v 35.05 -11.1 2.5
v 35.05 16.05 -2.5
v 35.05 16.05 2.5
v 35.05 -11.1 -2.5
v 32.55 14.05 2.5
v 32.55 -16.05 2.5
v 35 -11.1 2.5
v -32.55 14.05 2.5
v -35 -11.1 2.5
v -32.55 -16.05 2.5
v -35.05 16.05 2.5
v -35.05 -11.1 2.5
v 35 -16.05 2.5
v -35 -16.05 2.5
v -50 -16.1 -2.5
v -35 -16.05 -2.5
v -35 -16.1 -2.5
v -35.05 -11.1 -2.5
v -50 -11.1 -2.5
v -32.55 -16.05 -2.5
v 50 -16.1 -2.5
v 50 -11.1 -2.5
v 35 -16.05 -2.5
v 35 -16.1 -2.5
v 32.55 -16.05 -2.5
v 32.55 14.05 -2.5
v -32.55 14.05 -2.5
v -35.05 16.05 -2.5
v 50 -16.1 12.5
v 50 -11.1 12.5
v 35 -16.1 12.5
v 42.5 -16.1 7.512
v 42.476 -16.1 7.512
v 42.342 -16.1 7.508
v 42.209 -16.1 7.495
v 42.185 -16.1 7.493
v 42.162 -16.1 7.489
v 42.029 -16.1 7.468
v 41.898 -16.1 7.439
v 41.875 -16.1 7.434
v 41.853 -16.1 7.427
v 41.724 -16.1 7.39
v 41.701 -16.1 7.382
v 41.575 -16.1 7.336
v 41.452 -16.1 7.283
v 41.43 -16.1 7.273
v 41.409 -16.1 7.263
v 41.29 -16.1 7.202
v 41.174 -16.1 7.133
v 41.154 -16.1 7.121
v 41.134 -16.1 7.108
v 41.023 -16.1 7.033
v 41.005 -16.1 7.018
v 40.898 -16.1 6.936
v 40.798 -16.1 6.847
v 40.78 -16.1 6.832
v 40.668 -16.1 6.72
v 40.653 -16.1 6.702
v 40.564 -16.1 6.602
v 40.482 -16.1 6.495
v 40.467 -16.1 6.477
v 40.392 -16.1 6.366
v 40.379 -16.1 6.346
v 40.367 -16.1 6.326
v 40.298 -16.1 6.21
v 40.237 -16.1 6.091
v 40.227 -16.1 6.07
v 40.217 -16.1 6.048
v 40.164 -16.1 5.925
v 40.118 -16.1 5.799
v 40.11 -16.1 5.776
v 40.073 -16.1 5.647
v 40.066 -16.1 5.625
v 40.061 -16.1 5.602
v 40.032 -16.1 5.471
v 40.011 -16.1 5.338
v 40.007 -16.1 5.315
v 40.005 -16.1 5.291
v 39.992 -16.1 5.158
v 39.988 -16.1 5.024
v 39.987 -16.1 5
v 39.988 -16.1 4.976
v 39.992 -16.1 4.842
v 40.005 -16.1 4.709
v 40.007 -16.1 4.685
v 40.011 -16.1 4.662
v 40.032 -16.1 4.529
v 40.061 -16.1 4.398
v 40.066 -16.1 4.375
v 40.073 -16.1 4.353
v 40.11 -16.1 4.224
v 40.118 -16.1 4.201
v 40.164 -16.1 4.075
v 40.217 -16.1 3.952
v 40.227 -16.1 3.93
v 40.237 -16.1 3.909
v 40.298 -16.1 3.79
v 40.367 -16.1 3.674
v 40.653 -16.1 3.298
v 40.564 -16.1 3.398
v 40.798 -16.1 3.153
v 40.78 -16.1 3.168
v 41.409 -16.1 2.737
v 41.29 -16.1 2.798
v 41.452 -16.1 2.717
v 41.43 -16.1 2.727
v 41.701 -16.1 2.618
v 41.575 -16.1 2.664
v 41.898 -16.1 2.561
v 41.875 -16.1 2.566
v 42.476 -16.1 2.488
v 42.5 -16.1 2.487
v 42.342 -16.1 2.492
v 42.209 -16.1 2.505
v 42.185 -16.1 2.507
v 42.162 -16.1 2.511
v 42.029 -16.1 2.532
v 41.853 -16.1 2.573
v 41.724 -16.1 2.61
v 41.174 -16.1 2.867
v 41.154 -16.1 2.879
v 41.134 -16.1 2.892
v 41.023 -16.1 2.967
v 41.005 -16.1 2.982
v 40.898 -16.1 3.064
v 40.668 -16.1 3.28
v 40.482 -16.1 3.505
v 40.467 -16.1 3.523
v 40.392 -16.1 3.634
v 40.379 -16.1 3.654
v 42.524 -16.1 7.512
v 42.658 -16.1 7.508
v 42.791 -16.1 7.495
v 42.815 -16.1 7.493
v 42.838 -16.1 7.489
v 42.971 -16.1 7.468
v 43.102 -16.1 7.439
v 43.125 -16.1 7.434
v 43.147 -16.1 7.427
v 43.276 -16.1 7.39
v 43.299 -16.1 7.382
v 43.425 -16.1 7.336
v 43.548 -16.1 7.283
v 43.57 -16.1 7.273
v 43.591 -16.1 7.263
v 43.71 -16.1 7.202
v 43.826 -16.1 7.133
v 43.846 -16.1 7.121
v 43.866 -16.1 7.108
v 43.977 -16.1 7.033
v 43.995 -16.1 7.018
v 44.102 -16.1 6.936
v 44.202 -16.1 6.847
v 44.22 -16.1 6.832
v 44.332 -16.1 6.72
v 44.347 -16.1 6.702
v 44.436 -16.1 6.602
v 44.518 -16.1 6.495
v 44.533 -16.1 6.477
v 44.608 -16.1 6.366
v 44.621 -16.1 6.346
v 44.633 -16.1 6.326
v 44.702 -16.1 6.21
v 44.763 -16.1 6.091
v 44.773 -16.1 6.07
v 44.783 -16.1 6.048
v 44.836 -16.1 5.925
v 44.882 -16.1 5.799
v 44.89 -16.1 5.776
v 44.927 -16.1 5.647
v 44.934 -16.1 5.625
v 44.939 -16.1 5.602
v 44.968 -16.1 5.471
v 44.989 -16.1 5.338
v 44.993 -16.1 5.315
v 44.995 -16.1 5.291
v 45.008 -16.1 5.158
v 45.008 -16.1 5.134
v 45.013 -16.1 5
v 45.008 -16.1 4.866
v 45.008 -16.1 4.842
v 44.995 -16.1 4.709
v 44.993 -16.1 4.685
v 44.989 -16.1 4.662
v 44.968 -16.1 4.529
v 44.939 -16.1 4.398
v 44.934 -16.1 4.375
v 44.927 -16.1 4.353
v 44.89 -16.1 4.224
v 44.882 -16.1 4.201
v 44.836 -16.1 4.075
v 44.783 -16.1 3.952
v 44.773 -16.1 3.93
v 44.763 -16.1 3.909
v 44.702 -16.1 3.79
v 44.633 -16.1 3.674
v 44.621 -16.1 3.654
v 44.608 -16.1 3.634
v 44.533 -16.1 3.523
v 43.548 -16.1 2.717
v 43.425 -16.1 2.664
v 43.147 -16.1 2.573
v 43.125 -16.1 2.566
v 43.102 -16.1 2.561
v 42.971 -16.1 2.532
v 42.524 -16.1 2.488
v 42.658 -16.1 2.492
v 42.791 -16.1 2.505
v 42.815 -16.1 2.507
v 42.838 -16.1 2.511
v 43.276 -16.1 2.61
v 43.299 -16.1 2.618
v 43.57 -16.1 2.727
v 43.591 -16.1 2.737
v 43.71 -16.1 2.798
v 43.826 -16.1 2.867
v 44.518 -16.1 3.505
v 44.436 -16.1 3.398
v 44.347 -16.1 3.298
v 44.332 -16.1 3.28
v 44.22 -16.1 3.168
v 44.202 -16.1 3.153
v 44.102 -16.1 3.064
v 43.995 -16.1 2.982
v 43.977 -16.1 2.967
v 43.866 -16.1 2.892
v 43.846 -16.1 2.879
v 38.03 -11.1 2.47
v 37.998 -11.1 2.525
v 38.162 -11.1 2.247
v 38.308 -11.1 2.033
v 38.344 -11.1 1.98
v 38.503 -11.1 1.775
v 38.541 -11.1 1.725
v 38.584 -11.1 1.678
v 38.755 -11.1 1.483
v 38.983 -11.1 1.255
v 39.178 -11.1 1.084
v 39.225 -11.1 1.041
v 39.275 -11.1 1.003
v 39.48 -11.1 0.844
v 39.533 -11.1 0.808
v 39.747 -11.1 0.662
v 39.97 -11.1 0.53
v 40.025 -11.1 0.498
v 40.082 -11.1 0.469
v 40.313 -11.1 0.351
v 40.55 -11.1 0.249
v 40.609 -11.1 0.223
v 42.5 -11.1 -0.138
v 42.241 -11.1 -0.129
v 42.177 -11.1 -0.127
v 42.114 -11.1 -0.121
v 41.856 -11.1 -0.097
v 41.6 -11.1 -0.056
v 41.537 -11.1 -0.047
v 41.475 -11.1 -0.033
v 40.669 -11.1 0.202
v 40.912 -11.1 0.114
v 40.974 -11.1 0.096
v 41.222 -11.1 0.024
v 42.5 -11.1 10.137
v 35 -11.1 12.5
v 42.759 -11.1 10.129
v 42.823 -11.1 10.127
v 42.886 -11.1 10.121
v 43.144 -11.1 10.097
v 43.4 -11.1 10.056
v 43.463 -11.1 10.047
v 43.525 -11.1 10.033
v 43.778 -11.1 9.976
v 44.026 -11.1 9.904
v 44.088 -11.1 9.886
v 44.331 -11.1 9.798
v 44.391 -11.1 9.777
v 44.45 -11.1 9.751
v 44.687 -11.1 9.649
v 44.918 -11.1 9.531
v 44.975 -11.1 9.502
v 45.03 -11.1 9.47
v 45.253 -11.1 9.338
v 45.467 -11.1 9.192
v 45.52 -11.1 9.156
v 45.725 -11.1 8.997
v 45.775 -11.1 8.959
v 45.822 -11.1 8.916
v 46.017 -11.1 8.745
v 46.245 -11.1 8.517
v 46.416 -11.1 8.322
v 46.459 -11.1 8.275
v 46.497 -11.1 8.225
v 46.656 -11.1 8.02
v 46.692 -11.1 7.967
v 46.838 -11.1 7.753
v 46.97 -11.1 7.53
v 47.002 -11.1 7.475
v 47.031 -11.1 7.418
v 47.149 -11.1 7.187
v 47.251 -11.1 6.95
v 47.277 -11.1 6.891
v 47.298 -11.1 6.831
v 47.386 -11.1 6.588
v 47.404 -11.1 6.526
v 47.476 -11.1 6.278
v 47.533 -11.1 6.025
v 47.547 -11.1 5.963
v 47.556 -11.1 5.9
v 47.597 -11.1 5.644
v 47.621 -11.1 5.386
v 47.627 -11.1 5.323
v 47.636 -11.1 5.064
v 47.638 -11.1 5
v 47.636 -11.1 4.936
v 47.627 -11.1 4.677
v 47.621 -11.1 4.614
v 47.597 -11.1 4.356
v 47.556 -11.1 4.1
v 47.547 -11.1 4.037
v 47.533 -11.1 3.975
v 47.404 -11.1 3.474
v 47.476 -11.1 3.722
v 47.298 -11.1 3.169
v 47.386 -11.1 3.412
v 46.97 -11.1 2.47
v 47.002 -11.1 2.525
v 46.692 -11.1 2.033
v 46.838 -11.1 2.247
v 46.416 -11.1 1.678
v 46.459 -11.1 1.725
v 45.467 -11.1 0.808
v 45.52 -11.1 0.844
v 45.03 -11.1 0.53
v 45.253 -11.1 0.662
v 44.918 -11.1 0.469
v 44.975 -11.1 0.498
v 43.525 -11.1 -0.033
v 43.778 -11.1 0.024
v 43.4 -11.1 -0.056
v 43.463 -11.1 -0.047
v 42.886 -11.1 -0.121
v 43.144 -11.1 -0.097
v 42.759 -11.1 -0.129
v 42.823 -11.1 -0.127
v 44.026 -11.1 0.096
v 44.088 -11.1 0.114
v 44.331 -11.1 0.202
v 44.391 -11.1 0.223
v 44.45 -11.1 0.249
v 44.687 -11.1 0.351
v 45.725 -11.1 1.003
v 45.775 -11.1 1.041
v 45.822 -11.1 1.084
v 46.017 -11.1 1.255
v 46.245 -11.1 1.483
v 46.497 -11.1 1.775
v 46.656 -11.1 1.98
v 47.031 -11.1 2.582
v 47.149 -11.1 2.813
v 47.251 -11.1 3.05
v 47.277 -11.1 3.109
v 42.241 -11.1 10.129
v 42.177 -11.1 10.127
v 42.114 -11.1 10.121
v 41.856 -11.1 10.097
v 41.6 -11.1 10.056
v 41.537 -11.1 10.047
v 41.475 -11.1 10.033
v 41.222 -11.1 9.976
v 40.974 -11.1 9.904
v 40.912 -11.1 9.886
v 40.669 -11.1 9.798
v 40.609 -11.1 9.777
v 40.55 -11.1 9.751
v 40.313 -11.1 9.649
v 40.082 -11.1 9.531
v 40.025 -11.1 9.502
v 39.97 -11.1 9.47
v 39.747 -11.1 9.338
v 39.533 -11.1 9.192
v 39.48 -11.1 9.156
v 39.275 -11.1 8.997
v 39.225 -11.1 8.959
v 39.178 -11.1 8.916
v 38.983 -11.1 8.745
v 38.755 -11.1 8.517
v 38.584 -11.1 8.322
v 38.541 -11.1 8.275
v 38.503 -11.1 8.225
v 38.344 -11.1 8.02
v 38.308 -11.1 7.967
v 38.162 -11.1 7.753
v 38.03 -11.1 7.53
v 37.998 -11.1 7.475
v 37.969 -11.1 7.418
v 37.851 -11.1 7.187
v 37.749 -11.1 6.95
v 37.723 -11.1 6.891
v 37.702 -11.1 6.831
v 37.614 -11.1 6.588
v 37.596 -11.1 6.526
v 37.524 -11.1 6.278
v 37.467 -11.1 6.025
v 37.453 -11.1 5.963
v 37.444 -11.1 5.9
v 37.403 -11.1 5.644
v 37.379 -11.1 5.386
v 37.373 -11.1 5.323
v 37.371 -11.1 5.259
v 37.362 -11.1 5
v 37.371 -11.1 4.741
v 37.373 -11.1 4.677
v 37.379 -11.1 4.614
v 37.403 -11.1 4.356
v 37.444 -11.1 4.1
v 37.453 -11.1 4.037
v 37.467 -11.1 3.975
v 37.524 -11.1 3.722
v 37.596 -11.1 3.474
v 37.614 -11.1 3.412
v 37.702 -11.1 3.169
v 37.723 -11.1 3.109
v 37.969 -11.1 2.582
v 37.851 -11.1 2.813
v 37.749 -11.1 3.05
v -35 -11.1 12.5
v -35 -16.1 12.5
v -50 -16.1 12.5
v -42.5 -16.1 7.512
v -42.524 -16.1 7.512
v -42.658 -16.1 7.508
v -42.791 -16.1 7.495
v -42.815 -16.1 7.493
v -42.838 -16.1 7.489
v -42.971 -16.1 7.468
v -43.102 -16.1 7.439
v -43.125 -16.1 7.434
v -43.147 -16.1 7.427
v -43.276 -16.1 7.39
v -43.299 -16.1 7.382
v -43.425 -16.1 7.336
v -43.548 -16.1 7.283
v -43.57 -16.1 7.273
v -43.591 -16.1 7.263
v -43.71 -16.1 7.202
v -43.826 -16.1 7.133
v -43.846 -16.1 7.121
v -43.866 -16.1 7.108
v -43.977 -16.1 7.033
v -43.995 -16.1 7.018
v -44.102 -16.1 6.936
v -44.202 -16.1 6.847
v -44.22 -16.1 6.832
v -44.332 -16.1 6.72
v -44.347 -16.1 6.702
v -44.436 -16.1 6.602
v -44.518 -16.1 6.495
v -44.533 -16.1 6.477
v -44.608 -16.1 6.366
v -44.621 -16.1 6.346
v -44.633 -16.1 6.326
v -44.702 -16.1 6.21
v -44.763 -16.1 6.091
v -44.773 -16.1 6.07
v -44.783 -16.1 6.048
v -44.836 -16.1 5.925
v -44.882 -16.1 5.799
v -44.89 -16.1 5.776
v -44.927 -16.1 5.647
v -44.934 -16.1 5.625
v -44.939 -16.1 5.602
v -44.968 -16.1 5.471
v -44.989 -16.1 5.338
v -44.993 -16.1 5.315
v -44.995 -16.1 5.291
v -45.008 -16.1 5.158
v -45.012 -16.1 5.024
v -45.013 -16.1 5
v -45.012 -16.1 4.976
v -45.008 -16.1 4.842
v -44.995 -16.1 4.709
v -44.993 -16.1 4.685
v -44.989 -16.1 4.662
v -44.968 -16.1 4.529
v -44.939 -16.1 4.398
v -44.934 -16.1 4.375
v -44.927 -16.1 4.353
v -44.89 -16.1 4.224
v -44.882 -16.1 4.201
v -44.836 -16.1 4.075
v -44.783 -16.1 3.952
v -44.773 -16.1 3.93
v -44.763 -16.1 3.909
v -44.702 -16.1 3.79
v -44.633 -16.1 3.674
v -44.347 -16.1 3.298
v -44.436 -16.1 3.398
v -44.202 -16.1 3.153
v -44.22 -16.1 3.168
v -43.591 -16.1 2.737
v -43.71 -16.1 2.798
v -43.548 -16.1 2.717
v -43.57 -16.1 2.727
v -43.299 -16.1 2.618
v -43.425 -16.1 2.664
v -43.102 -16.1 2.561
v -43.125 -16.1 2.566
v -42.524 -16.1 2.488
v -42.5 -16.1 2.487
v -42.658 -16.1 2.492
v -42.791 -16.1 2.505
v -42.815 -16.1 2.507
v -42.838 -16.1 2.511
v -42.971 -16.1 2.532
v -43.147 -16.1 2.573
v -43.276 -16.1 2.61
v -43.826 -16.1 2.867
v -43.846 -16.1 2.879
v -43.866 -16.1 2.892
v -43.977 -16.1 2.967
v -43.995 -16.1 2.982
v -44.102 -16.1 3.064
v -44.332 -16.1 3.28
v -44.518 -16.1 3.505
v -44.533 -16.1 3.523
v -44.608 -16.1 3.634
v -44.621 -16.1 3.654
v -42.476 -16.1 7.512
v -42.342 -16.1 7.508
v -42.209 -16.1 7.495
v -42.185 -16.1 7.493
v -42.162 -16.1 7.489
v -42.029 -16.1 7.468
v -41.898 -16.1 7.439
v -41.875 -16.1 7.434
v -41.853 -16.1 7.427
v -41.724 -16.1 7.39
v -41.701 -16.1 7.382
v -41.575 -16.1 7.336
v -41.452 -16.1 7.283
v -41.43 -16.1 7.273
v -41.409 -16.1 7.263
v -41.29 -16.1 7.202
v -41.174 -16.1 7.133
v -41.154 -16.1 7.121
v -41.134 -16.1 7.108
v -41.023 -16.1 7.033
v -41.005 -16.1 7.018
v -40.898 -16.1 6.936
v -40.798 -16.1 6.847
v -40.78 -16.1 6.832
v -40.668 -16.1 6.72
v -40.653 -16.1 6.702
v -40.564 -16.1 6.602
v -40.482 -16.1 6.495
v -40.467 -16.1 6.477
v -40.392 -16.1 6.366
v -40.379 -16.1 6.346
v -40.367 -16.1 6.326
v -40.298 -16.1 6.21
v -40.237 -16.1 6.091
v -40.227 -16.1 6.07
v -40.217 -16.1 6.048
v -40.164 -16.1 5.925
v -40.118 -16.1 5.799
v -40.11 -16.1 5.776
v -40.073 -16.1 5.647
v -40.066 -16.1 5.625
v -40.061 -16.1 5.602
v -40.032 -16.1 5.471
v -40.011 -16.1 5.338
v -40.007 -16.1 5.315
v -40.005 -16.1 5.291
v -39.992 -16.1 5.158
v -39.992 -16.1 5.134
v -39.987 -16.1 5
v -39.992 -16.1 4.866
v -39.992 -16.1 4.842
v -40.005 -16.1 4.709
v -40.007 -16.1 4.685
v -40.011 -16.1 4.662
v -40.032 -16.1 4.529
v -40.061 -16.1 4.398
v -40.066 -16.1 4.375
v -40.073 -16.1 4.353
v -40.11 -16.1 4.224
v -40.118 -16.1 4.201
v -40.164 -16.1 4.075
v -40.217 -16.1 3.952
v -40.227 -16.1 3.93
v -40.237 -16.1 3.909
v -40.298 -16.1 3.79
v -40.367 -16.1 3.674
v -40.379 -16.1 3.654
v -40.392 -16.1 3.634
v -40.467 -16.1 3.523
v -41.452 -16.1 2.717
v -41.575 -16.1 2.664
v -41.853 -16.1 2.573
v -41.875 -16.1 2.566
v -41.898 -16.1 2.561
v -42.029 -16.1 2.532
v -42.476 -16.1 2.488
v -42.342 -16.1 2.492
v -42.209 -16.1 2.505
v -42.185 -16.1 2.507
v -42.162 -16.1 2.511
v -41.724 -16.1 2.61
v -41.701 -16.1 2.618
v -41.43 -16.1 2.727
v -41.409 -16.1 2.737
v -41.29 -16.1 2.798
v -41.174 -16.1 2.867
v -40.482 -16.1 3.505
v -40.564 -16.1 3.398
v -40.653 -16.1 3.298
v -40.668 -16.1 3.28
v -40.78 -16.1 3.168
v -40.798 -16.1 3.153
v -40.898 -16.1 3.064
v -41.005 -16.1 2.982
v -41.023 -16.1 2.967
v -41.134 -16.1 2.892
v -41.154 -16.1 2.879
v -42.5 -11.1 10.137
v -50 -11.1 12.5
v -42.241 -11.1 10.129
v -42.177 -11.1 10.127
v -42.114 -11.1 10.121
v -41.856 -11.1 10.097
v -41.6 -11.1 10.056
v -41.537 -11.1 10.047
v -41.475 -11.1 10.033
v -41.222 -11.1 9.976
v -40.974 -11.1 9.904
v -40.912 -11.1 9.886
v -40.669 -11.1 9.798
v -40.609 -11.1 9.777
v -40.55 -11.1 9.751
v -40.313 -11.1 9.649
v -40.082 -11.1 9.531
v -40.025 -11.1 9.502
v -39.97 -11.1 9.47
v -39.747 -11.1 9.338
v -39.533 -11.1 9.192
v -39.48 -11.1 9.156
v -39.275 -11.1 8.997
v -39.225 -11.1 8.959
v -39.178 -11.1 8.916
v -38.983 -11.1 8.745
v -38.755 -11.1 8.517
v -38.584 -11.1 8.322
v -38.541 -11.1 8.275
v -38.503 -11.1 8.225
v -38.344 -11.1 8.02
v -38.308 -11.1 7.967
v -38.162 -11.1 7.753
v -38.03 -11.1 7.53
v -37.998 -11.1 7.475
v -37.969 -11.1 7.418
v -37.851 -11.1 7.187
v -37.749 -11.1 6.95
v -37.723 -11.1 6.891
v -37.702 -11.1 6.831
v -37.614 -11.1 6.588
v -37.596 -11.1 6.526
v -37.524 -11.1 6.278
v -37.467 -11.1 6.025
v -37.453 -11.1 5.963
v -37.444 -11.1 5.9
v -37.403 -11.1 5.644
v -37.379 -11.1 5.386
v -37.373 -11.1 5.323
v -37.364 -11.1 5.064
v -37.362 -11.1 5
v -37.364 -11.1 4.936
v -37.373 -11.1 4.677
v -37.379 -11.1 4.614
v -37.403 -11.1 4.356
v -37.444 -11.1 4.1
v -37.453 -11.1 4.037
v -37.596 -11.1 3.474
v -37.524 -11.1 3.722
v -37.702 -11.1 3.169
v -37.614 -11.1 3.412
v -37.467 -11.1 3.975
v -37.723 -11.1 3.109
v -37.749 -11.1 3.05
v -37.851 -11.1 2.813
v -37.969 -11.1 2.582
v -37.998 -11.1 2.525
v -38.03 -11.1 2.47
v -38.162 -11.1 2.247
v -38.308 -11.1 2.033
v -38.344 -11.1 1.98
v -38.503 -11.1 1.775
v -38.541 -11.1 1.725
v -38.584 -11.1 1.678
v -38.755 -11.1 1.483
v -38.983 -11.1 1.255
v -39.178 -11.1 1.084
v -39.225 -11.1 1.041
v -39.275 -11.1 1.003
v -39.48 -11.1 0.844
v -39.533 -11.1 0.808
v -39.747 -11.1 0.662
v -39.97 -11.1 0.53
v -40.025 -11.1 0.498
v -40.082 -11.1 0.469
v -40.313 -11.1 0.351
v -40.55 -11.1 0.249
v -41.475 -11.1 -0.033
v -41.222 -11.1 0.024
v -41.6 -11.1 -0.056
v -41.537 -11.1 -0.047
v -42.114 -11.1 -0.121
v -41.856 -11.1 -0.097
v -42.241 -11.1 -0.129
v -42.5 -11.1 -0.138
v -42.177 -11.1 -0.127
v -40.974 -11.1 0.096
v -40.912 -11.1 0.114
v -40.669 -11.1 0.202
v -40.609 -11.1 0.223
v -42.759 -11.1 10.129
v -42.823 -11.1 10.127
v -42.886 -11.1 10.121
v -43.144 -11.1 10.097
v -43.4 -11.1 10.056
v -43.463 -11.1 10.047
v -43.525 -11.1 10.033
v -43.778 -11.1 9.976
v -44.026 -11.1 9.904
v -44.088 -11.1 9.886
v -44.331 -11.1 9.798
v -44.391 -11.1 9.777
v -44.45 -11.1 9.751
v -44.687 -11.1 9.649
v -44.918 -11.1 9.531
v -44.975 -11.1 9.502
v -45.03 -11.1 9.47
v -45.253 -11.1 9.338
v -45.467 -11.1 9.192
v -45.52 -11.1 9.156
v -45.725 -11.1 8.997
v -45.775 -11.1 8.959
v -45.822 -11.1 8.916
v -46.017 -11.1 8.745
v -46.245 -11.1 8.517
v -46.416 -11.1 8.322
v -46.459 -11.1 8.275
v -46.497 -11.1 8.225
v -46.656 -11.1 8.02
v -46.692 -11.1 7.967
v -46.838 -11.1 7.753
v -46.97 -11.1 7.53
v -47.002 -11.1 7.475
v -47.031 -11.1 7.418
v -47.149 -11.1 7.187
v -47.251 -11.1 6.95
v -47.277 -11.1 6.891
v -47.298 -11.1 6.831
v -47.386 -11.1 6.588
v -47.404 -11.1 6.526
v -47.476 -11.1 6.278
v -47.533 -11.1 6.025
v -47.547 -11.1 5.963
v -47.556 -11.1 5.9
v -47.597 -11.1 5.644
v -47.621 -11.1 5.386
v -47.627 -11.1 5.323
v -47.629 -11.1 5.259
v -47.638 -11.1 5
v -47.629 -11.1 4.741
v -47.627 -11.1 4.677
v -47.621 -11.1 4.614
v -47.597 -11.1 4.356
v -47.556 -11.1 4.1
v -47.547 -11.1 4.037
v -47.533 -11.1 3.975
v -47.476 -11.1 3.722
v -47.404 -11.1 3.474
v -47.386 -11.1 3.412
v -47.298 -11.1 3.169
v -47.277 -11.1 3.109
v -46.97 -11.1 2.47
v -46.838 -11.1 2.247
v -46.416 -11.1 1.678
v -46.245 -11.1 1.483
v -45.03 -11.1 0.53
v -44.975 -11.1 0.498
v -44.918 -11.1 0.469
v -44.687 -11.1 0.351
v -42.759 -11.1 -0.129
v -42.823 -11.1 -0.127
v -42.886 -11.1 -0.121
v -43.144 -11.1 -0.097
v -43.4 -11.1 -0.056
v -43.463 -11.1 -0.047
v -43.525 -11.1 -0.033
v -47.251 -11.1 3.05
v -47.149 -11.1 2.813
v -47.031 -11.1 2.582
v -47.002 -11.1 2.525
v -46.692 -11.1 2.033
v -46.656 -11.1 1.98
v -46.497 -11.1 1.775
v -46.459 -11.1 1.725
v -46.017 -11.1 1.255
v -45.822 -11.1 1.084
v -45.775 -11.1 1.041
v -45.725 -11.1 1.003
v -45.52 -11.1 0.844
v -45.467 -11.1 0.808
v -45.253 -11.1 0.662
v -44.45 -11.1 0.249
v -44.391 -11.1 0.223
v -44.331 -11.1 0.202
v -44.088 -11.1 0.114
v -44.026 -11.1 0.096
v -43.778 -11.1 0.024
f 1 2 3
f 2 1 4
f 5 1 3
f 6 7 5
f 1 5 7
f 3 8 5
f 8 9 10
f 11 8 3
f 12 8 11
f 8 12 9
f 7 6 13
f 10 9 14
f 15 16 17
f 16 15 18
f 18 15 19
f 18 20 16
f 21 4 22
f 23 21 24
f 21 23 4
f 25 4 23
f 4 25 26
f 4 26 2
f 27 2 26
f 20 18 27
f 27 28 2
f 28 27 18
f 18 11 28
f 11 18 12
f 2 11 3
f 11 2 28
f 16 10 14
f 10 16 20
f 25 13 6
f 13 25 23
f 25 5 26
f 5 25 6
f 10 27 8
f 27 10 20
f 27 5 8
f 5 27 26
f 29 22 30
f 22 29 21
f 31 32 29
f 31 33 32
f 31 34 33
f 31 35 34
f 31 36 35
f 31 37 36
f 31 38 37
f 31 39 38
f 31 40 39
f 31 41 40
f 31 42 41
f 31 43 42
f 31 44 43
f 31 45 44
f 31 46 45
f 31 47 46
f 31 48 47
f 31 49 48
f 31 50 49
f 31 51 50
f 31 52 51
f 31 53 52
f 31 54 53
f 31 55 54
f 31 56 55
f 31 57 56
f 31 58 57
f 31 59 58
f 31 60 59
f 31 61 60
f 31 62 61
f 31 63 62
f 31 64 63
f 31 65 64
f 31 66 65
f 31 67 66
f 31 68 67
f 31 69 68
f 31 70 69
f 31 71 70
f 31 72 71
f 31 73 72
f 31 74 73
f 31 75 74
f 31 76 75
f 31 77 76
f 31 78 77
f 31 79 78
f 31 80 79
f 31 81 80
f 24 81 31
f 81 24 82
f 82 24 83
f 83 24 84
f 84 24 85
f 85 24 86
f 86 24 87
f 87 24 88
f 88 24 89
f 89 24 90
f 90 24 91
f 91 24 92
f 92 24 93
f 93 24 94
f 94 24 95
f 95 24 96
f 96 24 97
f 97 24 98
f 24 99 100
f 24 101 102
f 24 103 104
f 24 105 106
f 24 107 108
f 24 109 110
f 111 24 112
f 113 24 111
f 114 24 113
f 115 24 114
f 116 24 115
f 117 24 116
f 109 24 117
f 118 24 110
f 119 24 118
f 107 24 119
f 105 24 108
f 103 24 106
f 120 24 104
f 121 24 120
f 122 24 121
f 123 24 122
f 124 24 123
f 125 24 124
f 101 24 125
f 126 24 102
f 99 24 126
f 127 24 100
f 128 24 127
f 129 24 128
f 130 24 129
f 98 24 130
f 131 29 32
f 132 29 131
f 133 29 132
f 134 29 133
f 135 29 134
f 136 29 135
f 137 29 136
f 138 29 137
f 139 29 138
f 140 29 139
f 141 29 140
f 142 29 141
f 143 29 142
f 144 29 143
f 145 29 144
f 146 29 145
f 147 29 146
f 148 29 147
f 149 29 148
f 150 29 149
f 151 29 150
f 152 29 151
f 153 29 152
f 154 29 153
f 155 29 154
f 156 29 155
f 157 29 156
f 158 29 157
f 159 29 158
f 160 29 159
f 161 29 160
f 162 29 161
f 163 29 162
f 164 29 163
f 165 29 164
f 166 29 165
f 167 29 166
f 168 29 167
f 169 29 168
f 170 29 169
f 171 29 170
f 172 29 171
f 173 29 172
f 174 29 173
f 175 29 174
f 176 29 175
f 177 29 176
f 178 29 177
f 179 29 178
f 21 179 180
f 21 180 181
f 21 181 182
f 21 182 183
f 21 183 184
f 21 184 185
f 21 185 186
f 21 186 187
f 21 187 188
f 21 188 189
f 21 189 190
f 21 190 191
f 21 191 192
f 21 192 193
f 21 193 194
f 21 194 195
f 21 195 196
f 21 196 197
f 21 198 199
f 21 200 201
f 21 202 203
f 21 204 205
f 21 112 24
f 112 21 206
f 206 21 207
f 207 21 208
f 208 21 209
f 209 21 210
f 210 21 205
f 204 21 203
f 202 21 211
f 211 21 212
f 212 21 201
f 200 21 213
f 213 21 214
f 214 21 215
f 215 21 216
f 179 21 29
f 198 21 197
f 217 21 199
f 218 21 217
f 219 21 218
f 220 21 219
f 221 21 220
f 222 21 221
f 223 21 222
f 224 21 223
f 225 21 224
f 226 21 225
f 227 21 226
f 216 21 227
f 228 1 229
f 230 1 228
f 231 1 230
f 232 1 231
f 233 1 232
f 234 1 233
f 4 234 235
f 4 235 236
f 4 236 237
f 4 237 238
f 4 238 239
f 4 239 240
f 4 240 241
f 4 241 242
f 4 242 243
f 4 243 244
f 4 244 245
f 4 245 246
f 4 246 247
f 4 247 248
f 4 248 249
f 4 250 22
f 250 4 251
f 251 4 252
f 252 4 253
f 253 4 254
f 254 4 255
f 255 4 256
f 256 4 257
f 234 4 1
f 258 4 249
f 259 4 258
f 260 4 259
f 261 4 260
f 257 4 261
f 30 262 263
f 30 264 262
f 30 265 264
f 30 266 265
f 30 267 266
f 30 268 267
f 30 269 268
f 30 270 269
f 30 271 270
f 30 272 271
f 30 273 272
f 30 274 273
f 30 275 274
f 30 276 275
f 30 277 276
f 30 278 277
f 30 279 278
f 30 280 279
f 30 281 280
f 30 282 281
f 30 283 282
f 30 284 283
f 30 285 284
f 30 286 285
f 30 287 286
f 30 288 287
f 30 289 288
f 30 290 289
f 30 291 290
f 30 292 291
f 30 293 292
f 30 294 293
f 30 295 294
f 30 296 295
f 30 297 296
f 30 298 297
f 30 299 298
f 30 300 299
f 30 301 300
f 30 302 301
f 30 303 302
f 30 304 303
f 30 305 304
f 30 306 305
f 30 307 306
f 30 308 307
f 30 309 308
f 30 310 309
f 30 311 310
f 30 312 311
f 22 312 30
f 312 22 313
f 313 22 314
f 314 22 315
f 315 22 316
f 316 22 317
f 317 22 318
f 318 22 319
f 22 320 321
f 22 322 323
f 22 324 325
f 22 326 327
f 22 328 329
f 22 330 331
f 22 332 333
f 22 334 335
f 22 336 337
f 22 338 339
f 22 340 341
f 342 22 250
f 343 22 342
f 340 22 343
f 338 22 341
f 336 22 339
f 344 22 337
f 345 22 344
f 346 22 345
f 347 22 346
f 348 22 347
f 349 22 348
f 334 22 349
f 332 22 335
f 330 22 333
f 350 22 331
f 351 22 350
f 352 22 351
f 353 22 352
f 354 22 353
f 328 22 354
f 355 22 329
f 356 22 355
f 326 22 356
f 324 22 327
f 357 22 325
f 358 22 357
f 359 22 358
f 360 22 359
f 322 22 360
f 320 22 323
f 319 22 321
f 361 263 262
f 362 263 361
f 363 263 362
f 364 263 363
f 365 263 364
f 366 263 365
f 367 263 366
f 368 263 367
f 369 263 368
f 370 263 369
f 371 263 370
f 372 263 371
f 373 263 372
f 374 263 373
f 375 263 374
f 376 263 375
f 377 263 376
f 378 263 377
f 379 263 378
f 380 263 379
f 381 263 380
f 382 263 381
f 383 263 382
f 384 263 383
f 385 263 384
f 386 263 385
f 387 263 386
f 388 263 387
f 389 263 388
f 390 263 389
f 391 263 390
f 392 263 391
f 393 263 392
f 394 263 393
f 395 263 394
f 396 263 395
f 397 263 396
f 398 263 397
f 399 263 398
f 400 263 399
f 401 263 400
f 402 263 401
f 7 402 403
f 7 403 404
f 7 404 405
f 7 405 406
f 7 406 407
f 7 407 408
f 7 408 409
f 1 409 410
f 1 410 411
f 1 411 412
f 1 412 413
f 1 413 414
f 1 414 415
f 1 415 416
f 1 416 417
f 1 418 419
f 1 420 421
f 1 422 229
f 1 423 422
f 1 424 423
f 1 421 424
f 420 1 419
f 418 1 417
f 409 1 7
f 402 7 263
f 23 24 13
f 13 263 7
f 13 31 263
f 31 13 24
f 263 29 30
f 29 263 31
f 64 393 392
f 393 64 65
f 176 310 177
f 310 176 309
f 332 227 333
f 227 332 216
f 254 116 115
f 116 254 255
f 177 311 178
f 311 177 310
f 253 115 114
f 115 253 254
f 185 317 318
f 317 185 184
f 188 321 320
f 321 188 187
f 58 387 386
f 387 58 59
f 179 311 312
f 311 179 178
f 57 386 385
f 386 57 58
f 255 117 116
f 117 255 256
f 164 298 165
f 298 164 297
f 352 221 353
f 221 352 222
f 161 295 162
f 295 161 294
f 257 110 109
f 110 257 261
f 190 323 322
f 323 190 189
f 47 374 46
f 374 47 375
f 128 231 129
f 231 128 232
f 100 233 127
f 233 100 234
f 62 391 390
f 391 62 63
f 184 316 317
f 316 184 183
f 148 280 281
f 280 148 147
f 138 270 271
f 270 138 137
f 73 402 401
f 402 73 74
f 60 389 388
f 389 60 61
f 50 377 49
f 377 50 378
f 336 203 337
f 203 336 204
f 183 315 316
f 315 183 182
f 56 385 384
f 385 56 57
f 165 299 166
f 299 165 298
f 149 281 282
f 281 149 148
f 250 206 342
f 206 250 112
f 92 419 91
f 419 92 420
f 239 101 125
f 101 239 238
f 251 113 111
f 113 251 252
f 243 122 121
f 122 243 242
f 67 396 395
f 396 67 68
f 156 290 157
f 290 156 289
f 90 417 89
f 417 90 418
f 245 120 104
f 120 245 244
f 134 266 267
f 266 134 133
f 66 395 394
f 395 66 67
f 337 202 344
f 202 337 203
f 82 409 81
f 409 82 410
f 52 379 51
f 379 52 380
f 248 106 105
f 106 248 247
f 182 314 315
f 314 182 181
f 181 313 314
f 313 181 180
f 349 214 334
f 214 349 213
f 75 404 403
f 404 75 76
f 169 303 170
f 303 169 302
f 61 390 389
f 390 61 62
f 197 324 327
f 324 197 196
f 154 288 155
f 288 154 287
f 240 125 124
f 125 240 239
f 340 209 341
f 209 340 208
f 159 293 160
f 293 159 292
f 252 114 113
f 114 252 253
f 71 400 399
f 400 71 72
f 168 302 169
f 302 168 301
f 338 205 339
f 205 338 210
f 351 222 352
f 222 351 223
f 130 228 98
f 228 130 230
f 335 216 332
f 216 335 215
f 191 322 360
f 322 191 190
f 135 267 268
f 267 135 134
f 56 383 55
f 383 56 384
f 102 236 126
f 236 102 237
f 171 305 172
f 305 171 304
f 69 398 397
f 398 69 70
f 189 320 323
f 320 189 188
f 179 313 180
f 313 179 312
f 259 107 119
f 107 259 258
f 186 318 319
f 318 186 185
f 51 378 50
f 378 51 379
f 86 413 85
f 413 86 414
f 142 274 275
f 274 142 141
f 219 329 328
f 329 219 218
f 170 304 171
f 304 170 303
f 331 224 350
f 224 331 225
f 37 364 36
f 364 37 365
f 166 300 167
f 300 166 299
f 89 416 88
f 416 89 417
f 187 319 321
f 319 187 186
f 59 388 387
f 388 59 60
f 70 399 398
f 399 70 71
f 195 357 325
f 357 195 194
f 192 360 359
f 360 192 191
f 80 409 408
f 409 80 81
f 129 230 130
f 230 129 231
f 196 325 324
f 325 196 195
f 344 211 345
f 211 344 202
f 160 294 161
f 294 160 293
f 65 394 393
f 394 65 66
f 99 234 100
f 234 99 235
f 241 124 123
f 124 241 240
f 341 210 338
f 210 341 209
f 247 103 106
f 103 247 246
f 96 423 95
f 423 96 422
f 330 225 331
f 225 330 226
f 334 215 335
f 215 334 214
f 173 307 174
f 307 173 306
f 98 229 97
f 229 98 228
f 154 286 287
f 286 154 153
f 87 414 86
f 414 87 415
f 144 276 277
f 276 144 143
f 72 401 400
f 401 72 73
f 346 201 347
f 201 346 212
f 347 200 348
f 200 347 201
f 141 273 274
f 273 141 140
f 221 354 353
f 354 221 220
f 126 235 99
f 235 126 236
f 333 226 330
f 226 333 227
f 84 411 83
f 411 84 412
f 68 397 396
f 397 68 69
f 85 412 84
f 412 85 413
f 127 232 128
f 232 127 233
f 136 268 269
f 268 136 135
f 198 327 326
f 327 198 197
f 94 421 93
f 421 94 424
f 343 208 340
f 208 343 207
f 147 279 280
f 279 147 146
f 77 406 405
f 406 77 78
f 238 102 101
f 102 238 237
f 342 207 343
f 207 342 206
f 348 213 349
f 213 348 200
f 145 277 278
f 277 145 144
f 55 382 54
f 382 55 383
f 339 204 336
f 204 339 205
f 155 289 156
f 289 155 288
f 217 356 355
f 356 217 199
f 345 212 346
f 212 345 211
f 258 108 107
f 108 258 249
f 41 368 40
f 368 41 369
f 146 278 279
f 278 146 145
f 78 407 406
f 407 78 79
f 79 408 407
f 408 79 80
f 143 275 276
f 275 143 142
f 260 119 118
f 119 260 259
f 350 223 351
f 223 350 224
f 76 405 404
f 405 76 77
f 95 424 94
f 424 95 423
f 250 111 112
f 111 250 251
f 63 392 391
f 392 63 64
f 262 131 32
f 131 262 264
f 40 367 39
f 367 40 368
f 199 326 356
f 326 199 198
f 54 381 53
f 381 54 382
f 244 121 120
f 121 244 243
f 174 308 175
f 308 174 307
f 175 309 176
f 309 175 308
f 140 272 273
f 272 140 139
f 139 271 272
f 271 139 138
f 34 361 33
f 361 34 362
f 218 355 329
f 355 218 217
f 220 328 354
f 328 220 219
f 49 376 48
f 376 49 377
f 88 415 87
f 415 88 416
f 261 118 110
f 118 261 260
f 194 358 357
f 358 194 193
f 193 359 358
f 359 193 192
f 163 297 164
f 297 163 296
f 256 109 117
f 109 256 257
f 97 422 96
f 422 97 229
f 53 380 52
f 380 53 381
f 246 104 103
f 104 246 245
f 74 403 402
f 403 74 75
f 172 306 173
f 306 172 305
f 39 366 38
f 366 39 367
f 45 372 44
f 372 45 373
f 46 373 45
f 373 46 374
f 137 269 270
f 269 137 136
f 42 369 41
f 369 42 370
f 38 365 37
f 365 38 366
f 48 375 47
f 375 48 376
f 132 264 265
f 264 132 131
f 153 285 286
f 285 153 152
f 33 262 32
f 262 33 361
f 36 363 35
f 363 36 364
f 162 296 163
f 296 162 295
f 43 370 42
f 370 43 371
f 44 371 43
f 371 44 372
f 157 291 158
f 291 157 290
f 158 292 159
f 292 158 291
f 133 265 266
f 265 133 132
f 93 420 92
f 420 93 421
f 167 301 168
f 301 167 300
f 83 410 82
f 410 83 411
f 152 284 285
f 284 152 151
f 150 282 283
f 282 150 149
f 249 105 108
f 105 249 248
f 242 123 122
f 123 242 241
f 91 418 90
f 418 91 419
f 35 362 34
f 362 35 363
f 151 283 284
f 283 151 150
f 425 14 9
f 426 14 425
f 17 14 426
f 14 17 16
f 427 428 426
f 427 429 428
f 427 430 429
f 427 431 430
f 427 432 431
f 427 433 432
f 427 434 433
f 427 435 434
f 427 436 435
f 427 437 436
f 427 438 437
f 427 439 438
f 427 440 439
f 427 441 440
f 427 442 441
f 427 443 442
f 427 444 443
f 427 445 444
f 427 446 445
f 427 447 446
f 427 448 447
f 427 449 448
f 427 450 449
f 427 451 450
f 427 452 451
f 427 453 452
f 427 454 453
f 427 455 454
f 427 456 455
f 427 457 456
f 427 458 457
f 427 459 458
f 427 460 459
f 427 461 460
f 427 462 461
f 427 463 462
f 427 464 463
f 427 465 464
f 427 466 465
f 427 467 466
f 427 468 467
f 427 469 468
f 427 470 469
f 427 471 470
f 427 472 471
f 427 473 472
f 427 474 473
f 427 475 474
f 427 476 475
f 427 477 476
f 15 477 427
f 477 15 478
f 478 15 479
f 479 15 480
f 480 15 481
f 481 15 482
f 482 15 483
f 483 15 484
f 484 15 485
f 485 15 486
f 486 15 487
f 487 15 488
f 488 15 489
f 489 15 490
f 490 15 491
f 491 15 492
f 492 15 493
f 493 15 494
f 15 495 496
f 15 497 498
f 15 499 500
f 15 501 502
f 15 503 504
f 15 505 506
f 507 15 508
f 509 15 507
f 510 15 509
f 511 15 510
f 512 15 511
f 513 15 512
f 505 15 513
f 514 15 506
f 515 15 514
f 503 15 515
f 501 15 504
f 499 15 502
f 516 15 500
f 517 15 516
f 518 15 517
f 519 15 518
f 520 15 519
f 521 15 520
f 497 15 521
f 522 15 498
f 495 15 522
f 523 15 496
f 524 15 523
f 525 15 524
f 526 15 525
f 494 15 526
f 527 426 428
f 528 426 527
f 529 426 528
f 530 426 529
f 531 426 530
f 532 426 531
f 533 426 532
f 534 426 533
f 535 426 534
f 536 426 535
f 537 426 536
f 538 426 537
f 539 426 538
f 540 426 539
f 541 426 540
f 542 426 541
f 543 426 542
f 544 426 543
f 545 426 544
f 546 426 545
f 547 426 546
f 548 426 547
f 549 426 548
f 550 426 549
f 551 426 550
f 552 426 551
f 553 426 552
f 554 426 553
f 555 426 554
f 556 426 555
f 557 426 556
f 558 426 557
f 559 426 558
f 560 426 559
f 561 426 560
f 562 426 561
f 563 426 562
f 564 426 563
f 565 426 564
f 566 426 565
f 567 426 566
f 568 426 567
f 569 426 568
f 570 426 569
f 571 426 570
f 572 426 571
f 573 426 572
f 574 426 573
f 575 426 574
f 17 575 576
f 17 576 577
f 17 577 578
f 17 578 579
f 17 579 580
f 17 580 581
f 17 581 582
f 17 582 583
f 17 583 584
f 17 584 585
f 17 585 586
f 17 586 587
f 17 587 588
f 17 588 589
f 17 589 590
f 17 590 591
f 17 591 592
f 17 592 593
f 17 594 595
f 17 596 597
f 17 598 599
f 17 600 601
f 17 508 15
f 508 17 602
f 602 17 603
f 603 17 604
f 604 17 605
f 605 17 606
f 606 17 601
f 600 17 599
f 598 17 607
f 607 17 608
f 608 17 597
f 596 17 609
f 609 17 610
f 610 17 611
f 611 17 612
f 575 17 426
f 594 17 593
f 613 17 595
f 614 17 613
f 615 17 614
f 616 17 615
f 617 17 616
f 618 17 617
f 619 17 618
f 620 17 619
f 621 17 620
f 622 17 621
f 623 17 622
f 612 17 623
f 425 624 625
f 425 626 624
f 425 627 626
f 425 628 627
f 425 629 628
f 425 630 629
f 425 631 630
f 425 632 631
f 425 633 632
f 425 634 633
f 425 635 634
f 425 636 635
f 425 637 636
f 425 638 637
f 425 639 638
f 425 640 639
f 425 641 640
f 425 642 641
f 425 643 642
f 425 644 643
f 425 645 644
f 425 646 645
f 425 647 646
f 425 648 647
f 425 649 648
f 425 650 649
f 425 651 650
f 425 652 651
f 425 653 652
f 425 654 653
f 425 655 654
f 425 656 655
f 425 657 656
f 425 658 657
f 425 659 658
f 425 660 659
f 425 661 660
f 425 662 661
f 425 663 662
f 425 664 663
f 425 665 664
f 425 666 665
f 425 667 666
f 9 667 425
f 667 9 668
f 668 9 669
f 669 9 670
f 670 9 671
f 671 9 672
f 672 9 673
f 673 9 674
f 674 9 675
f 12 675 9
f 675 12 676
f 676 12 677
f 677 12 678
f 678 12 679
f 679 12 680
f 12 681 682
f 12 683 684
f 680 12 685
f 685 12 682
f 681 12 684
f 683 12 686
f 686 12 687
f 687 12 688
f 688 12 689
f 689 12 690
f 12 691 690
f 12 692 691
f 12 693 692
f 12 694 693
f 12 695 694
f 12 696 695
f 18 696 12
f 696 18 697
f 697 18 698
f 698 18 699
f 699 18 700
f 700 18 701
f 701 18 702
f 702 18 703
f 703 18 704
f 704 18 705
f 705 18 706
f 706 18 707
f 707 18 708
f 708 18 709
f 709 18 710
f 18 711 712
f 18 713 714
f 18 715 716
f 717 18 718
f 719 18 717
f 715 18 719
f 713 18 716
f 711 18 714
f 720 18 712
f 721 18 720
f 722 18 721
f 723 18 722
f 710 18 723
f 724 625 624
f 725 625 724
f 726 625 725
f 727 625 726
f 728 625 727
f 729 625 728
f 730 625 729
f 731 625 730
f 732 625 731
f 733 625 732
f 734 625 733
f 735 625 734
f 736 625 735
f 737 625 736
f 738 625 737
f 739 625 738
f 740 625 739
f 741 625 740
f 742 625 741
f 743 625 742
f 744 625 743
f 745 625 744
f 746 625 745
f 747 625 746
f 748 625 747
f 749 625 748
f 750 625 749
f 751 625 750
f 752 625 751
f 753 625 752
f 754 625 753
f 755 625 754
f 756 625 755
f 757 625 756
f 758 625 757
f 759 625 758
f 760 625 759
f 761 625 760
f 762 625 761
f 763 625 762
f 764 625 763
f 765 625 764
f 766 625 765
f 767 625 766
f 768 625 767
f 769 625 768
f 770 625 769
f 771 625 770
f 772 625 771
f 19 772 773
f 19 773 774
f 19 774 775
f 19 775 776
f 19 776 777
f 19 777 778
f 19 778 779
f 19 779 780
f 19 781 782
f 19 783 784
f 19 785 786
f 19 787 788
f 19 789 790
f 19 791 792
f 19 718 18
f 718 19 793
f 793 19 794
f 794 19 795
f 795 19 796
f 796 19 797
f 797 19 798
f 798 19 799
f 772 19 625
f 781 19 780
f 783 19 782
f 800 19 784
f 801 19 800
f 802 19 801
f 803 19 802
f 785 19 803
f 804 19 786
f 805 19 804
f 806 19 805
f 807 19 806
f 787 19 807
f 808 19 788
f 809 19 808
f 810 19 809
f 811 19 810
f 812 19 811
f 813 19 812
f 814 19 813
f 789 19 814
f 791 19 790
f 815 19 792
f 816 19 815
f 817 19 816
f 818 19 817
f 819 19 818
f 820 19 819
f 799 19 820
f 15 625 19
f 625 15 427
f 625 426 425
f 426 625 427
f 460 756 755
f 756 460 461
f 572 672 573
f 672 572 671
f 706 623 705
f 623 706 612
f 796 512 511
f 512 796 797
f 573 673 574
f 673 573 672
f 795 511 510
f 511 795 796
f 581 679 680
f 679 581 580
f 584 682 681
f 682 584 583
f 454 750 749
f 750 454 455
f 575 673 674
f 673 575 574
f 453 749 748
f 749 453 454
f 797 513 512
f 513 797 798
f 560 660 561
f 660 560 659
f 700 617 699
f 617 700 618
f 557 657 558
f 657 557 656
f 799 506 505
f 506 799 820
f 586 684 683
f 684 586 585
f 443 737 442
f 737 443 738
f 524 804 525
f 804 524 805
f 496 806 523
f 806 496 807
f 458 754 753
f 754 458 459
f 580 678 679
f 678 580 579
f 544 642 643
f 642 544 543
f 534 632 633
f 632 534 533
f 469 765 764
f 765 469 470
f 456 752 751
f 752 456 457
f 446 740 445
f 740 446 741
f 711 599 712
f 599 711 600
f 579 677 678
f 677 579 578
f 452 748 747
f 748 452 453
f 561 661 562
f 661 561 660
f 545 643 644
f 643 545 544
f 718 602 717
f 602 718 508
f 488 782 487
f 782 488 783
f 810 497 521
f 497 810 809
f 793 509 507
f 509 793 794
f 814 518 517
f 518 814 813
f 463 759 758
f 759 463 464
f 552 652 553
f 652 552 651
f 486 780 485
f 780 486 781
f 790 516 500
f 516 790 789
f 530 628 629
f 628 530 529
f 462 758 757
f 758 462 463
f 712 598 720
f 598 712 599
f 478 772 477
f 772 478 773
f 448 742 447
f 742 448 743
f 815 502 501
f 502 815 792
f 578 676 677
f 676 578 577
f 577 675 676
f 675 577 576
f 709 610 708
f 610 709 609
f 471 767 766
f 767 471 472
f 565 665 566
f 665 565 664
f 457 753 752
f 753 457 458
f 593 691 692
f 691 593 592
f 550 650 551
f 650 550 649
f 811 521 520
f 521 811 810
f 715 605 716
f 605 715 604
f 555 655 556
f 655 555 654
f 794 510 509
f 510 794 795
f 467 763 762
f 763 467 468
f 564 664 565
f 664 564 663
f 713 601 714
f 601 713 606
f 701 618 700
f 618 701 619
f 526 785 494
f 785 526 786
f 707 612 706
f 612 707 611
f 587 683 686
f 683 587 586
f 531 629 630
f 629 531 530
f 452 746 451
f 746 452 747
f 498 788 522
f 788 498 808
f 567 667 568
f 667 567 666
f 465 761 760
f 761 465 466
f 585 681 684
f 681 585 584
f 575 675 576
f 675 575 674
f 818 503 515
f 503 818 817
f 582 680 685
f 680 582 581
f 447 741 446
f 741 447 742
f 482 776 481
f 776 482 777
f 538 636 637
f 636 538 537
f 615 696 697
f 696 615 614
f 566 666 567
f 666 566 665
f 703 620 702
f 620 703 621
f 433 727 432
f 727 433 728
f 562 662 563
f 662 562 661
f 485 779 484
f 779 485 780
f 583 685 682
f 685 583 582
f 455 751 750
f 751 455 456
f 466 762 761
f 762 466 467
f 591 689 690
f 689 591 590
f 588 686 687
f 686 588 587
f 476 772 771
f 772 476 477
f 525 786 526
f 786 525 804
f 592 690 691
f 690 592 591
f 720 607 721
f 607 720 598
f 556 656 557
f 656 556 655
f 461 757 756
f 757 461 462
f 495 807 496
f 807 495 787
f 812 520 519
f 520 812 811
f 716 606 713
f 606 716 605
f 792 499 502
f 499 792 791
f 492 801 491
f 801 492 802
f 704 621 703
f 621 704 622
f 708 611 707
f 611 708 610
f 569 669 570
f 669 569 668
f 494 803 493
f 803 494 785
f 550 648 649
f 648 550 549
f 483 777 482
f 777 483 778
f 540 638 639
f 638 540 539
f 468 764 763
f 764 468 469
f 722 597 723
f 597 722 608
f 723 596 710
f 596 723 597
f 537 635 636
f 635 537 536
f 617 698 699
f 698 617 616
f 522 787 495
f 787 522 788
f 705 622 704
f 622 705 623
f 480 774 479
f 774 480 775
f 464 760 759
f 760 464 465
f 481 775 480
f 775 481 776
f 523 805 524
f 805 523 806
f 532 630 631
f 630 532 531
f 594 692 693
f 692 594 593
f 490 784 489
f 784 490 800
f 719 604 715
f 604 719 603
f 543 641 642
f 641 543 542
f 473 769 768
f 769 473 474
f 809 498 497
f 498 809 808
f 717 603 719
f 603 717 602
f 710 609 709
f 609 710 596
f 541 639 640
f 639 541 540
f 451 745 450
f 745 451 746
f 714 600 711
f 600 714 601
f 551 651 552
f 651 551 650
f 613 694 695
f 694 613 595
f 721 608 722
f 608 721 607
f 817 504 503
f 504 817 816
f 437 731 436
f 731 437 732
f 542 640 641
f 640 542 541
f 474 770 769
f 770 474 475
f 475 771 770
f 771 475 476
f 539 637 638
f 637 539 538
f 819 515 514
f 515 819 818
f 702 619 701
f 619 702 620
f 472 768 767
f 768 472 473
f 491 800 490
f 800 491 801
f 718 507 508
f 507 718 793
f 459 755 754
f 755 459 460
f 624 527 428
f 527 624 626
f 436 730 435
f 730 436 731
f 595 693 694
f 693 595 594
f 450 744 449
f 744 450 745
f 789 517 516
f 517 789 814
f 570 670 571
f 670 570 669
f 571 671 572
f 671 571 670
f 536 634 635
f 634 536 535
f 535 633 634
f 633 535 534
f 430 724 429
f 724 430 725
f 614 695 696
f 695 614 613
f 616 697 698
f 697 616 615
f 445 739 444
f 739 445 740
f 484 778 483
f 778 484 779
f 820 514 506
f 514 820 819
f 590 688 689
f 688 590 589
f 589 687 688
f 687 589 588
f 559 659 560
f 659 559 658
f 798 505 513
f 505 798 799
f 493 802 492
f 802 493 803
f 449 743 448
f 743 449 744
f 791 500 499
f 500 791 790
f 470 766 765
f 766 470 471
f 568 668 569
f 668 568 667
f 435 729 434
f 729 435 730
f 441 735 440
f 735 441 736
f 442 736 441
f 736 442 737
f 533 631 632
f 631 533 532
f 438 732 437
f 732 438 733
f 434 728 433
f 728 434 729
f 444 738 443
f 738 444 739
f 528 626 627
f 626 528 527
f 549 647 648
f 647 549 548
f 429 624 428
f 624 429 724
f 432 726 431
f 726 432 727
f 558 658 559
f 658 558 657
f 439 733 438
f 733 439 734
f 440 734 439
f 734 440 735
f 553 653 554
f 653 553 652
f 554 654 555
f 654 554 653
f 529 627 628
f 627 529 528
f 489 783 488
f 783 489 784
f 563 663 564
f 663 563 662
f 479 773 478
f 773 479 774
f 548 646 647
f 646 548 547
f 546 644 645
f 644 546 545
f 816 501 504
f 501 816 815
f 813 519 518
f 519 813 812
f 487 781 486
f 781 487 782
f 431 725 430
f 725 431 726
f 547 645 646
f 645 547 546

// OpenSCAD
 
psu_height = 65.1;
psu_width = 32.1;
thickness = 5;

$fn=100;

difference() {
    cube(size = [psu_height + thickness, psu_width, thickness], center = true);
    translate([0, -2, 0])
    cube(size = [psu_height, psu_width, thickness], center = true);
}

translate([49.5, -10.6, 5])
rotate([90, 0, 0])
difference() {
    translate([-7, 0, 3])
    cube(size = [15, 15, 5], center = true);
    color("red")
    translate([-7, 0, 1])
    linear_extrude(height = 10, center = true, scale=[0.3,0.3])
    circle(d = 15);
}

translate([-35.5, -10.6, 5])
rotate([90, 0, 0])
difference() {
    translate([-7, 0, 3])
    cube(size = [15, 15, 5], center = true);
    color("red")
    translate([-7, 0, 1])
    linear_extrude(height = 10, center = true, scale=[0.3,0.3])
    circle(d = 15);
}
